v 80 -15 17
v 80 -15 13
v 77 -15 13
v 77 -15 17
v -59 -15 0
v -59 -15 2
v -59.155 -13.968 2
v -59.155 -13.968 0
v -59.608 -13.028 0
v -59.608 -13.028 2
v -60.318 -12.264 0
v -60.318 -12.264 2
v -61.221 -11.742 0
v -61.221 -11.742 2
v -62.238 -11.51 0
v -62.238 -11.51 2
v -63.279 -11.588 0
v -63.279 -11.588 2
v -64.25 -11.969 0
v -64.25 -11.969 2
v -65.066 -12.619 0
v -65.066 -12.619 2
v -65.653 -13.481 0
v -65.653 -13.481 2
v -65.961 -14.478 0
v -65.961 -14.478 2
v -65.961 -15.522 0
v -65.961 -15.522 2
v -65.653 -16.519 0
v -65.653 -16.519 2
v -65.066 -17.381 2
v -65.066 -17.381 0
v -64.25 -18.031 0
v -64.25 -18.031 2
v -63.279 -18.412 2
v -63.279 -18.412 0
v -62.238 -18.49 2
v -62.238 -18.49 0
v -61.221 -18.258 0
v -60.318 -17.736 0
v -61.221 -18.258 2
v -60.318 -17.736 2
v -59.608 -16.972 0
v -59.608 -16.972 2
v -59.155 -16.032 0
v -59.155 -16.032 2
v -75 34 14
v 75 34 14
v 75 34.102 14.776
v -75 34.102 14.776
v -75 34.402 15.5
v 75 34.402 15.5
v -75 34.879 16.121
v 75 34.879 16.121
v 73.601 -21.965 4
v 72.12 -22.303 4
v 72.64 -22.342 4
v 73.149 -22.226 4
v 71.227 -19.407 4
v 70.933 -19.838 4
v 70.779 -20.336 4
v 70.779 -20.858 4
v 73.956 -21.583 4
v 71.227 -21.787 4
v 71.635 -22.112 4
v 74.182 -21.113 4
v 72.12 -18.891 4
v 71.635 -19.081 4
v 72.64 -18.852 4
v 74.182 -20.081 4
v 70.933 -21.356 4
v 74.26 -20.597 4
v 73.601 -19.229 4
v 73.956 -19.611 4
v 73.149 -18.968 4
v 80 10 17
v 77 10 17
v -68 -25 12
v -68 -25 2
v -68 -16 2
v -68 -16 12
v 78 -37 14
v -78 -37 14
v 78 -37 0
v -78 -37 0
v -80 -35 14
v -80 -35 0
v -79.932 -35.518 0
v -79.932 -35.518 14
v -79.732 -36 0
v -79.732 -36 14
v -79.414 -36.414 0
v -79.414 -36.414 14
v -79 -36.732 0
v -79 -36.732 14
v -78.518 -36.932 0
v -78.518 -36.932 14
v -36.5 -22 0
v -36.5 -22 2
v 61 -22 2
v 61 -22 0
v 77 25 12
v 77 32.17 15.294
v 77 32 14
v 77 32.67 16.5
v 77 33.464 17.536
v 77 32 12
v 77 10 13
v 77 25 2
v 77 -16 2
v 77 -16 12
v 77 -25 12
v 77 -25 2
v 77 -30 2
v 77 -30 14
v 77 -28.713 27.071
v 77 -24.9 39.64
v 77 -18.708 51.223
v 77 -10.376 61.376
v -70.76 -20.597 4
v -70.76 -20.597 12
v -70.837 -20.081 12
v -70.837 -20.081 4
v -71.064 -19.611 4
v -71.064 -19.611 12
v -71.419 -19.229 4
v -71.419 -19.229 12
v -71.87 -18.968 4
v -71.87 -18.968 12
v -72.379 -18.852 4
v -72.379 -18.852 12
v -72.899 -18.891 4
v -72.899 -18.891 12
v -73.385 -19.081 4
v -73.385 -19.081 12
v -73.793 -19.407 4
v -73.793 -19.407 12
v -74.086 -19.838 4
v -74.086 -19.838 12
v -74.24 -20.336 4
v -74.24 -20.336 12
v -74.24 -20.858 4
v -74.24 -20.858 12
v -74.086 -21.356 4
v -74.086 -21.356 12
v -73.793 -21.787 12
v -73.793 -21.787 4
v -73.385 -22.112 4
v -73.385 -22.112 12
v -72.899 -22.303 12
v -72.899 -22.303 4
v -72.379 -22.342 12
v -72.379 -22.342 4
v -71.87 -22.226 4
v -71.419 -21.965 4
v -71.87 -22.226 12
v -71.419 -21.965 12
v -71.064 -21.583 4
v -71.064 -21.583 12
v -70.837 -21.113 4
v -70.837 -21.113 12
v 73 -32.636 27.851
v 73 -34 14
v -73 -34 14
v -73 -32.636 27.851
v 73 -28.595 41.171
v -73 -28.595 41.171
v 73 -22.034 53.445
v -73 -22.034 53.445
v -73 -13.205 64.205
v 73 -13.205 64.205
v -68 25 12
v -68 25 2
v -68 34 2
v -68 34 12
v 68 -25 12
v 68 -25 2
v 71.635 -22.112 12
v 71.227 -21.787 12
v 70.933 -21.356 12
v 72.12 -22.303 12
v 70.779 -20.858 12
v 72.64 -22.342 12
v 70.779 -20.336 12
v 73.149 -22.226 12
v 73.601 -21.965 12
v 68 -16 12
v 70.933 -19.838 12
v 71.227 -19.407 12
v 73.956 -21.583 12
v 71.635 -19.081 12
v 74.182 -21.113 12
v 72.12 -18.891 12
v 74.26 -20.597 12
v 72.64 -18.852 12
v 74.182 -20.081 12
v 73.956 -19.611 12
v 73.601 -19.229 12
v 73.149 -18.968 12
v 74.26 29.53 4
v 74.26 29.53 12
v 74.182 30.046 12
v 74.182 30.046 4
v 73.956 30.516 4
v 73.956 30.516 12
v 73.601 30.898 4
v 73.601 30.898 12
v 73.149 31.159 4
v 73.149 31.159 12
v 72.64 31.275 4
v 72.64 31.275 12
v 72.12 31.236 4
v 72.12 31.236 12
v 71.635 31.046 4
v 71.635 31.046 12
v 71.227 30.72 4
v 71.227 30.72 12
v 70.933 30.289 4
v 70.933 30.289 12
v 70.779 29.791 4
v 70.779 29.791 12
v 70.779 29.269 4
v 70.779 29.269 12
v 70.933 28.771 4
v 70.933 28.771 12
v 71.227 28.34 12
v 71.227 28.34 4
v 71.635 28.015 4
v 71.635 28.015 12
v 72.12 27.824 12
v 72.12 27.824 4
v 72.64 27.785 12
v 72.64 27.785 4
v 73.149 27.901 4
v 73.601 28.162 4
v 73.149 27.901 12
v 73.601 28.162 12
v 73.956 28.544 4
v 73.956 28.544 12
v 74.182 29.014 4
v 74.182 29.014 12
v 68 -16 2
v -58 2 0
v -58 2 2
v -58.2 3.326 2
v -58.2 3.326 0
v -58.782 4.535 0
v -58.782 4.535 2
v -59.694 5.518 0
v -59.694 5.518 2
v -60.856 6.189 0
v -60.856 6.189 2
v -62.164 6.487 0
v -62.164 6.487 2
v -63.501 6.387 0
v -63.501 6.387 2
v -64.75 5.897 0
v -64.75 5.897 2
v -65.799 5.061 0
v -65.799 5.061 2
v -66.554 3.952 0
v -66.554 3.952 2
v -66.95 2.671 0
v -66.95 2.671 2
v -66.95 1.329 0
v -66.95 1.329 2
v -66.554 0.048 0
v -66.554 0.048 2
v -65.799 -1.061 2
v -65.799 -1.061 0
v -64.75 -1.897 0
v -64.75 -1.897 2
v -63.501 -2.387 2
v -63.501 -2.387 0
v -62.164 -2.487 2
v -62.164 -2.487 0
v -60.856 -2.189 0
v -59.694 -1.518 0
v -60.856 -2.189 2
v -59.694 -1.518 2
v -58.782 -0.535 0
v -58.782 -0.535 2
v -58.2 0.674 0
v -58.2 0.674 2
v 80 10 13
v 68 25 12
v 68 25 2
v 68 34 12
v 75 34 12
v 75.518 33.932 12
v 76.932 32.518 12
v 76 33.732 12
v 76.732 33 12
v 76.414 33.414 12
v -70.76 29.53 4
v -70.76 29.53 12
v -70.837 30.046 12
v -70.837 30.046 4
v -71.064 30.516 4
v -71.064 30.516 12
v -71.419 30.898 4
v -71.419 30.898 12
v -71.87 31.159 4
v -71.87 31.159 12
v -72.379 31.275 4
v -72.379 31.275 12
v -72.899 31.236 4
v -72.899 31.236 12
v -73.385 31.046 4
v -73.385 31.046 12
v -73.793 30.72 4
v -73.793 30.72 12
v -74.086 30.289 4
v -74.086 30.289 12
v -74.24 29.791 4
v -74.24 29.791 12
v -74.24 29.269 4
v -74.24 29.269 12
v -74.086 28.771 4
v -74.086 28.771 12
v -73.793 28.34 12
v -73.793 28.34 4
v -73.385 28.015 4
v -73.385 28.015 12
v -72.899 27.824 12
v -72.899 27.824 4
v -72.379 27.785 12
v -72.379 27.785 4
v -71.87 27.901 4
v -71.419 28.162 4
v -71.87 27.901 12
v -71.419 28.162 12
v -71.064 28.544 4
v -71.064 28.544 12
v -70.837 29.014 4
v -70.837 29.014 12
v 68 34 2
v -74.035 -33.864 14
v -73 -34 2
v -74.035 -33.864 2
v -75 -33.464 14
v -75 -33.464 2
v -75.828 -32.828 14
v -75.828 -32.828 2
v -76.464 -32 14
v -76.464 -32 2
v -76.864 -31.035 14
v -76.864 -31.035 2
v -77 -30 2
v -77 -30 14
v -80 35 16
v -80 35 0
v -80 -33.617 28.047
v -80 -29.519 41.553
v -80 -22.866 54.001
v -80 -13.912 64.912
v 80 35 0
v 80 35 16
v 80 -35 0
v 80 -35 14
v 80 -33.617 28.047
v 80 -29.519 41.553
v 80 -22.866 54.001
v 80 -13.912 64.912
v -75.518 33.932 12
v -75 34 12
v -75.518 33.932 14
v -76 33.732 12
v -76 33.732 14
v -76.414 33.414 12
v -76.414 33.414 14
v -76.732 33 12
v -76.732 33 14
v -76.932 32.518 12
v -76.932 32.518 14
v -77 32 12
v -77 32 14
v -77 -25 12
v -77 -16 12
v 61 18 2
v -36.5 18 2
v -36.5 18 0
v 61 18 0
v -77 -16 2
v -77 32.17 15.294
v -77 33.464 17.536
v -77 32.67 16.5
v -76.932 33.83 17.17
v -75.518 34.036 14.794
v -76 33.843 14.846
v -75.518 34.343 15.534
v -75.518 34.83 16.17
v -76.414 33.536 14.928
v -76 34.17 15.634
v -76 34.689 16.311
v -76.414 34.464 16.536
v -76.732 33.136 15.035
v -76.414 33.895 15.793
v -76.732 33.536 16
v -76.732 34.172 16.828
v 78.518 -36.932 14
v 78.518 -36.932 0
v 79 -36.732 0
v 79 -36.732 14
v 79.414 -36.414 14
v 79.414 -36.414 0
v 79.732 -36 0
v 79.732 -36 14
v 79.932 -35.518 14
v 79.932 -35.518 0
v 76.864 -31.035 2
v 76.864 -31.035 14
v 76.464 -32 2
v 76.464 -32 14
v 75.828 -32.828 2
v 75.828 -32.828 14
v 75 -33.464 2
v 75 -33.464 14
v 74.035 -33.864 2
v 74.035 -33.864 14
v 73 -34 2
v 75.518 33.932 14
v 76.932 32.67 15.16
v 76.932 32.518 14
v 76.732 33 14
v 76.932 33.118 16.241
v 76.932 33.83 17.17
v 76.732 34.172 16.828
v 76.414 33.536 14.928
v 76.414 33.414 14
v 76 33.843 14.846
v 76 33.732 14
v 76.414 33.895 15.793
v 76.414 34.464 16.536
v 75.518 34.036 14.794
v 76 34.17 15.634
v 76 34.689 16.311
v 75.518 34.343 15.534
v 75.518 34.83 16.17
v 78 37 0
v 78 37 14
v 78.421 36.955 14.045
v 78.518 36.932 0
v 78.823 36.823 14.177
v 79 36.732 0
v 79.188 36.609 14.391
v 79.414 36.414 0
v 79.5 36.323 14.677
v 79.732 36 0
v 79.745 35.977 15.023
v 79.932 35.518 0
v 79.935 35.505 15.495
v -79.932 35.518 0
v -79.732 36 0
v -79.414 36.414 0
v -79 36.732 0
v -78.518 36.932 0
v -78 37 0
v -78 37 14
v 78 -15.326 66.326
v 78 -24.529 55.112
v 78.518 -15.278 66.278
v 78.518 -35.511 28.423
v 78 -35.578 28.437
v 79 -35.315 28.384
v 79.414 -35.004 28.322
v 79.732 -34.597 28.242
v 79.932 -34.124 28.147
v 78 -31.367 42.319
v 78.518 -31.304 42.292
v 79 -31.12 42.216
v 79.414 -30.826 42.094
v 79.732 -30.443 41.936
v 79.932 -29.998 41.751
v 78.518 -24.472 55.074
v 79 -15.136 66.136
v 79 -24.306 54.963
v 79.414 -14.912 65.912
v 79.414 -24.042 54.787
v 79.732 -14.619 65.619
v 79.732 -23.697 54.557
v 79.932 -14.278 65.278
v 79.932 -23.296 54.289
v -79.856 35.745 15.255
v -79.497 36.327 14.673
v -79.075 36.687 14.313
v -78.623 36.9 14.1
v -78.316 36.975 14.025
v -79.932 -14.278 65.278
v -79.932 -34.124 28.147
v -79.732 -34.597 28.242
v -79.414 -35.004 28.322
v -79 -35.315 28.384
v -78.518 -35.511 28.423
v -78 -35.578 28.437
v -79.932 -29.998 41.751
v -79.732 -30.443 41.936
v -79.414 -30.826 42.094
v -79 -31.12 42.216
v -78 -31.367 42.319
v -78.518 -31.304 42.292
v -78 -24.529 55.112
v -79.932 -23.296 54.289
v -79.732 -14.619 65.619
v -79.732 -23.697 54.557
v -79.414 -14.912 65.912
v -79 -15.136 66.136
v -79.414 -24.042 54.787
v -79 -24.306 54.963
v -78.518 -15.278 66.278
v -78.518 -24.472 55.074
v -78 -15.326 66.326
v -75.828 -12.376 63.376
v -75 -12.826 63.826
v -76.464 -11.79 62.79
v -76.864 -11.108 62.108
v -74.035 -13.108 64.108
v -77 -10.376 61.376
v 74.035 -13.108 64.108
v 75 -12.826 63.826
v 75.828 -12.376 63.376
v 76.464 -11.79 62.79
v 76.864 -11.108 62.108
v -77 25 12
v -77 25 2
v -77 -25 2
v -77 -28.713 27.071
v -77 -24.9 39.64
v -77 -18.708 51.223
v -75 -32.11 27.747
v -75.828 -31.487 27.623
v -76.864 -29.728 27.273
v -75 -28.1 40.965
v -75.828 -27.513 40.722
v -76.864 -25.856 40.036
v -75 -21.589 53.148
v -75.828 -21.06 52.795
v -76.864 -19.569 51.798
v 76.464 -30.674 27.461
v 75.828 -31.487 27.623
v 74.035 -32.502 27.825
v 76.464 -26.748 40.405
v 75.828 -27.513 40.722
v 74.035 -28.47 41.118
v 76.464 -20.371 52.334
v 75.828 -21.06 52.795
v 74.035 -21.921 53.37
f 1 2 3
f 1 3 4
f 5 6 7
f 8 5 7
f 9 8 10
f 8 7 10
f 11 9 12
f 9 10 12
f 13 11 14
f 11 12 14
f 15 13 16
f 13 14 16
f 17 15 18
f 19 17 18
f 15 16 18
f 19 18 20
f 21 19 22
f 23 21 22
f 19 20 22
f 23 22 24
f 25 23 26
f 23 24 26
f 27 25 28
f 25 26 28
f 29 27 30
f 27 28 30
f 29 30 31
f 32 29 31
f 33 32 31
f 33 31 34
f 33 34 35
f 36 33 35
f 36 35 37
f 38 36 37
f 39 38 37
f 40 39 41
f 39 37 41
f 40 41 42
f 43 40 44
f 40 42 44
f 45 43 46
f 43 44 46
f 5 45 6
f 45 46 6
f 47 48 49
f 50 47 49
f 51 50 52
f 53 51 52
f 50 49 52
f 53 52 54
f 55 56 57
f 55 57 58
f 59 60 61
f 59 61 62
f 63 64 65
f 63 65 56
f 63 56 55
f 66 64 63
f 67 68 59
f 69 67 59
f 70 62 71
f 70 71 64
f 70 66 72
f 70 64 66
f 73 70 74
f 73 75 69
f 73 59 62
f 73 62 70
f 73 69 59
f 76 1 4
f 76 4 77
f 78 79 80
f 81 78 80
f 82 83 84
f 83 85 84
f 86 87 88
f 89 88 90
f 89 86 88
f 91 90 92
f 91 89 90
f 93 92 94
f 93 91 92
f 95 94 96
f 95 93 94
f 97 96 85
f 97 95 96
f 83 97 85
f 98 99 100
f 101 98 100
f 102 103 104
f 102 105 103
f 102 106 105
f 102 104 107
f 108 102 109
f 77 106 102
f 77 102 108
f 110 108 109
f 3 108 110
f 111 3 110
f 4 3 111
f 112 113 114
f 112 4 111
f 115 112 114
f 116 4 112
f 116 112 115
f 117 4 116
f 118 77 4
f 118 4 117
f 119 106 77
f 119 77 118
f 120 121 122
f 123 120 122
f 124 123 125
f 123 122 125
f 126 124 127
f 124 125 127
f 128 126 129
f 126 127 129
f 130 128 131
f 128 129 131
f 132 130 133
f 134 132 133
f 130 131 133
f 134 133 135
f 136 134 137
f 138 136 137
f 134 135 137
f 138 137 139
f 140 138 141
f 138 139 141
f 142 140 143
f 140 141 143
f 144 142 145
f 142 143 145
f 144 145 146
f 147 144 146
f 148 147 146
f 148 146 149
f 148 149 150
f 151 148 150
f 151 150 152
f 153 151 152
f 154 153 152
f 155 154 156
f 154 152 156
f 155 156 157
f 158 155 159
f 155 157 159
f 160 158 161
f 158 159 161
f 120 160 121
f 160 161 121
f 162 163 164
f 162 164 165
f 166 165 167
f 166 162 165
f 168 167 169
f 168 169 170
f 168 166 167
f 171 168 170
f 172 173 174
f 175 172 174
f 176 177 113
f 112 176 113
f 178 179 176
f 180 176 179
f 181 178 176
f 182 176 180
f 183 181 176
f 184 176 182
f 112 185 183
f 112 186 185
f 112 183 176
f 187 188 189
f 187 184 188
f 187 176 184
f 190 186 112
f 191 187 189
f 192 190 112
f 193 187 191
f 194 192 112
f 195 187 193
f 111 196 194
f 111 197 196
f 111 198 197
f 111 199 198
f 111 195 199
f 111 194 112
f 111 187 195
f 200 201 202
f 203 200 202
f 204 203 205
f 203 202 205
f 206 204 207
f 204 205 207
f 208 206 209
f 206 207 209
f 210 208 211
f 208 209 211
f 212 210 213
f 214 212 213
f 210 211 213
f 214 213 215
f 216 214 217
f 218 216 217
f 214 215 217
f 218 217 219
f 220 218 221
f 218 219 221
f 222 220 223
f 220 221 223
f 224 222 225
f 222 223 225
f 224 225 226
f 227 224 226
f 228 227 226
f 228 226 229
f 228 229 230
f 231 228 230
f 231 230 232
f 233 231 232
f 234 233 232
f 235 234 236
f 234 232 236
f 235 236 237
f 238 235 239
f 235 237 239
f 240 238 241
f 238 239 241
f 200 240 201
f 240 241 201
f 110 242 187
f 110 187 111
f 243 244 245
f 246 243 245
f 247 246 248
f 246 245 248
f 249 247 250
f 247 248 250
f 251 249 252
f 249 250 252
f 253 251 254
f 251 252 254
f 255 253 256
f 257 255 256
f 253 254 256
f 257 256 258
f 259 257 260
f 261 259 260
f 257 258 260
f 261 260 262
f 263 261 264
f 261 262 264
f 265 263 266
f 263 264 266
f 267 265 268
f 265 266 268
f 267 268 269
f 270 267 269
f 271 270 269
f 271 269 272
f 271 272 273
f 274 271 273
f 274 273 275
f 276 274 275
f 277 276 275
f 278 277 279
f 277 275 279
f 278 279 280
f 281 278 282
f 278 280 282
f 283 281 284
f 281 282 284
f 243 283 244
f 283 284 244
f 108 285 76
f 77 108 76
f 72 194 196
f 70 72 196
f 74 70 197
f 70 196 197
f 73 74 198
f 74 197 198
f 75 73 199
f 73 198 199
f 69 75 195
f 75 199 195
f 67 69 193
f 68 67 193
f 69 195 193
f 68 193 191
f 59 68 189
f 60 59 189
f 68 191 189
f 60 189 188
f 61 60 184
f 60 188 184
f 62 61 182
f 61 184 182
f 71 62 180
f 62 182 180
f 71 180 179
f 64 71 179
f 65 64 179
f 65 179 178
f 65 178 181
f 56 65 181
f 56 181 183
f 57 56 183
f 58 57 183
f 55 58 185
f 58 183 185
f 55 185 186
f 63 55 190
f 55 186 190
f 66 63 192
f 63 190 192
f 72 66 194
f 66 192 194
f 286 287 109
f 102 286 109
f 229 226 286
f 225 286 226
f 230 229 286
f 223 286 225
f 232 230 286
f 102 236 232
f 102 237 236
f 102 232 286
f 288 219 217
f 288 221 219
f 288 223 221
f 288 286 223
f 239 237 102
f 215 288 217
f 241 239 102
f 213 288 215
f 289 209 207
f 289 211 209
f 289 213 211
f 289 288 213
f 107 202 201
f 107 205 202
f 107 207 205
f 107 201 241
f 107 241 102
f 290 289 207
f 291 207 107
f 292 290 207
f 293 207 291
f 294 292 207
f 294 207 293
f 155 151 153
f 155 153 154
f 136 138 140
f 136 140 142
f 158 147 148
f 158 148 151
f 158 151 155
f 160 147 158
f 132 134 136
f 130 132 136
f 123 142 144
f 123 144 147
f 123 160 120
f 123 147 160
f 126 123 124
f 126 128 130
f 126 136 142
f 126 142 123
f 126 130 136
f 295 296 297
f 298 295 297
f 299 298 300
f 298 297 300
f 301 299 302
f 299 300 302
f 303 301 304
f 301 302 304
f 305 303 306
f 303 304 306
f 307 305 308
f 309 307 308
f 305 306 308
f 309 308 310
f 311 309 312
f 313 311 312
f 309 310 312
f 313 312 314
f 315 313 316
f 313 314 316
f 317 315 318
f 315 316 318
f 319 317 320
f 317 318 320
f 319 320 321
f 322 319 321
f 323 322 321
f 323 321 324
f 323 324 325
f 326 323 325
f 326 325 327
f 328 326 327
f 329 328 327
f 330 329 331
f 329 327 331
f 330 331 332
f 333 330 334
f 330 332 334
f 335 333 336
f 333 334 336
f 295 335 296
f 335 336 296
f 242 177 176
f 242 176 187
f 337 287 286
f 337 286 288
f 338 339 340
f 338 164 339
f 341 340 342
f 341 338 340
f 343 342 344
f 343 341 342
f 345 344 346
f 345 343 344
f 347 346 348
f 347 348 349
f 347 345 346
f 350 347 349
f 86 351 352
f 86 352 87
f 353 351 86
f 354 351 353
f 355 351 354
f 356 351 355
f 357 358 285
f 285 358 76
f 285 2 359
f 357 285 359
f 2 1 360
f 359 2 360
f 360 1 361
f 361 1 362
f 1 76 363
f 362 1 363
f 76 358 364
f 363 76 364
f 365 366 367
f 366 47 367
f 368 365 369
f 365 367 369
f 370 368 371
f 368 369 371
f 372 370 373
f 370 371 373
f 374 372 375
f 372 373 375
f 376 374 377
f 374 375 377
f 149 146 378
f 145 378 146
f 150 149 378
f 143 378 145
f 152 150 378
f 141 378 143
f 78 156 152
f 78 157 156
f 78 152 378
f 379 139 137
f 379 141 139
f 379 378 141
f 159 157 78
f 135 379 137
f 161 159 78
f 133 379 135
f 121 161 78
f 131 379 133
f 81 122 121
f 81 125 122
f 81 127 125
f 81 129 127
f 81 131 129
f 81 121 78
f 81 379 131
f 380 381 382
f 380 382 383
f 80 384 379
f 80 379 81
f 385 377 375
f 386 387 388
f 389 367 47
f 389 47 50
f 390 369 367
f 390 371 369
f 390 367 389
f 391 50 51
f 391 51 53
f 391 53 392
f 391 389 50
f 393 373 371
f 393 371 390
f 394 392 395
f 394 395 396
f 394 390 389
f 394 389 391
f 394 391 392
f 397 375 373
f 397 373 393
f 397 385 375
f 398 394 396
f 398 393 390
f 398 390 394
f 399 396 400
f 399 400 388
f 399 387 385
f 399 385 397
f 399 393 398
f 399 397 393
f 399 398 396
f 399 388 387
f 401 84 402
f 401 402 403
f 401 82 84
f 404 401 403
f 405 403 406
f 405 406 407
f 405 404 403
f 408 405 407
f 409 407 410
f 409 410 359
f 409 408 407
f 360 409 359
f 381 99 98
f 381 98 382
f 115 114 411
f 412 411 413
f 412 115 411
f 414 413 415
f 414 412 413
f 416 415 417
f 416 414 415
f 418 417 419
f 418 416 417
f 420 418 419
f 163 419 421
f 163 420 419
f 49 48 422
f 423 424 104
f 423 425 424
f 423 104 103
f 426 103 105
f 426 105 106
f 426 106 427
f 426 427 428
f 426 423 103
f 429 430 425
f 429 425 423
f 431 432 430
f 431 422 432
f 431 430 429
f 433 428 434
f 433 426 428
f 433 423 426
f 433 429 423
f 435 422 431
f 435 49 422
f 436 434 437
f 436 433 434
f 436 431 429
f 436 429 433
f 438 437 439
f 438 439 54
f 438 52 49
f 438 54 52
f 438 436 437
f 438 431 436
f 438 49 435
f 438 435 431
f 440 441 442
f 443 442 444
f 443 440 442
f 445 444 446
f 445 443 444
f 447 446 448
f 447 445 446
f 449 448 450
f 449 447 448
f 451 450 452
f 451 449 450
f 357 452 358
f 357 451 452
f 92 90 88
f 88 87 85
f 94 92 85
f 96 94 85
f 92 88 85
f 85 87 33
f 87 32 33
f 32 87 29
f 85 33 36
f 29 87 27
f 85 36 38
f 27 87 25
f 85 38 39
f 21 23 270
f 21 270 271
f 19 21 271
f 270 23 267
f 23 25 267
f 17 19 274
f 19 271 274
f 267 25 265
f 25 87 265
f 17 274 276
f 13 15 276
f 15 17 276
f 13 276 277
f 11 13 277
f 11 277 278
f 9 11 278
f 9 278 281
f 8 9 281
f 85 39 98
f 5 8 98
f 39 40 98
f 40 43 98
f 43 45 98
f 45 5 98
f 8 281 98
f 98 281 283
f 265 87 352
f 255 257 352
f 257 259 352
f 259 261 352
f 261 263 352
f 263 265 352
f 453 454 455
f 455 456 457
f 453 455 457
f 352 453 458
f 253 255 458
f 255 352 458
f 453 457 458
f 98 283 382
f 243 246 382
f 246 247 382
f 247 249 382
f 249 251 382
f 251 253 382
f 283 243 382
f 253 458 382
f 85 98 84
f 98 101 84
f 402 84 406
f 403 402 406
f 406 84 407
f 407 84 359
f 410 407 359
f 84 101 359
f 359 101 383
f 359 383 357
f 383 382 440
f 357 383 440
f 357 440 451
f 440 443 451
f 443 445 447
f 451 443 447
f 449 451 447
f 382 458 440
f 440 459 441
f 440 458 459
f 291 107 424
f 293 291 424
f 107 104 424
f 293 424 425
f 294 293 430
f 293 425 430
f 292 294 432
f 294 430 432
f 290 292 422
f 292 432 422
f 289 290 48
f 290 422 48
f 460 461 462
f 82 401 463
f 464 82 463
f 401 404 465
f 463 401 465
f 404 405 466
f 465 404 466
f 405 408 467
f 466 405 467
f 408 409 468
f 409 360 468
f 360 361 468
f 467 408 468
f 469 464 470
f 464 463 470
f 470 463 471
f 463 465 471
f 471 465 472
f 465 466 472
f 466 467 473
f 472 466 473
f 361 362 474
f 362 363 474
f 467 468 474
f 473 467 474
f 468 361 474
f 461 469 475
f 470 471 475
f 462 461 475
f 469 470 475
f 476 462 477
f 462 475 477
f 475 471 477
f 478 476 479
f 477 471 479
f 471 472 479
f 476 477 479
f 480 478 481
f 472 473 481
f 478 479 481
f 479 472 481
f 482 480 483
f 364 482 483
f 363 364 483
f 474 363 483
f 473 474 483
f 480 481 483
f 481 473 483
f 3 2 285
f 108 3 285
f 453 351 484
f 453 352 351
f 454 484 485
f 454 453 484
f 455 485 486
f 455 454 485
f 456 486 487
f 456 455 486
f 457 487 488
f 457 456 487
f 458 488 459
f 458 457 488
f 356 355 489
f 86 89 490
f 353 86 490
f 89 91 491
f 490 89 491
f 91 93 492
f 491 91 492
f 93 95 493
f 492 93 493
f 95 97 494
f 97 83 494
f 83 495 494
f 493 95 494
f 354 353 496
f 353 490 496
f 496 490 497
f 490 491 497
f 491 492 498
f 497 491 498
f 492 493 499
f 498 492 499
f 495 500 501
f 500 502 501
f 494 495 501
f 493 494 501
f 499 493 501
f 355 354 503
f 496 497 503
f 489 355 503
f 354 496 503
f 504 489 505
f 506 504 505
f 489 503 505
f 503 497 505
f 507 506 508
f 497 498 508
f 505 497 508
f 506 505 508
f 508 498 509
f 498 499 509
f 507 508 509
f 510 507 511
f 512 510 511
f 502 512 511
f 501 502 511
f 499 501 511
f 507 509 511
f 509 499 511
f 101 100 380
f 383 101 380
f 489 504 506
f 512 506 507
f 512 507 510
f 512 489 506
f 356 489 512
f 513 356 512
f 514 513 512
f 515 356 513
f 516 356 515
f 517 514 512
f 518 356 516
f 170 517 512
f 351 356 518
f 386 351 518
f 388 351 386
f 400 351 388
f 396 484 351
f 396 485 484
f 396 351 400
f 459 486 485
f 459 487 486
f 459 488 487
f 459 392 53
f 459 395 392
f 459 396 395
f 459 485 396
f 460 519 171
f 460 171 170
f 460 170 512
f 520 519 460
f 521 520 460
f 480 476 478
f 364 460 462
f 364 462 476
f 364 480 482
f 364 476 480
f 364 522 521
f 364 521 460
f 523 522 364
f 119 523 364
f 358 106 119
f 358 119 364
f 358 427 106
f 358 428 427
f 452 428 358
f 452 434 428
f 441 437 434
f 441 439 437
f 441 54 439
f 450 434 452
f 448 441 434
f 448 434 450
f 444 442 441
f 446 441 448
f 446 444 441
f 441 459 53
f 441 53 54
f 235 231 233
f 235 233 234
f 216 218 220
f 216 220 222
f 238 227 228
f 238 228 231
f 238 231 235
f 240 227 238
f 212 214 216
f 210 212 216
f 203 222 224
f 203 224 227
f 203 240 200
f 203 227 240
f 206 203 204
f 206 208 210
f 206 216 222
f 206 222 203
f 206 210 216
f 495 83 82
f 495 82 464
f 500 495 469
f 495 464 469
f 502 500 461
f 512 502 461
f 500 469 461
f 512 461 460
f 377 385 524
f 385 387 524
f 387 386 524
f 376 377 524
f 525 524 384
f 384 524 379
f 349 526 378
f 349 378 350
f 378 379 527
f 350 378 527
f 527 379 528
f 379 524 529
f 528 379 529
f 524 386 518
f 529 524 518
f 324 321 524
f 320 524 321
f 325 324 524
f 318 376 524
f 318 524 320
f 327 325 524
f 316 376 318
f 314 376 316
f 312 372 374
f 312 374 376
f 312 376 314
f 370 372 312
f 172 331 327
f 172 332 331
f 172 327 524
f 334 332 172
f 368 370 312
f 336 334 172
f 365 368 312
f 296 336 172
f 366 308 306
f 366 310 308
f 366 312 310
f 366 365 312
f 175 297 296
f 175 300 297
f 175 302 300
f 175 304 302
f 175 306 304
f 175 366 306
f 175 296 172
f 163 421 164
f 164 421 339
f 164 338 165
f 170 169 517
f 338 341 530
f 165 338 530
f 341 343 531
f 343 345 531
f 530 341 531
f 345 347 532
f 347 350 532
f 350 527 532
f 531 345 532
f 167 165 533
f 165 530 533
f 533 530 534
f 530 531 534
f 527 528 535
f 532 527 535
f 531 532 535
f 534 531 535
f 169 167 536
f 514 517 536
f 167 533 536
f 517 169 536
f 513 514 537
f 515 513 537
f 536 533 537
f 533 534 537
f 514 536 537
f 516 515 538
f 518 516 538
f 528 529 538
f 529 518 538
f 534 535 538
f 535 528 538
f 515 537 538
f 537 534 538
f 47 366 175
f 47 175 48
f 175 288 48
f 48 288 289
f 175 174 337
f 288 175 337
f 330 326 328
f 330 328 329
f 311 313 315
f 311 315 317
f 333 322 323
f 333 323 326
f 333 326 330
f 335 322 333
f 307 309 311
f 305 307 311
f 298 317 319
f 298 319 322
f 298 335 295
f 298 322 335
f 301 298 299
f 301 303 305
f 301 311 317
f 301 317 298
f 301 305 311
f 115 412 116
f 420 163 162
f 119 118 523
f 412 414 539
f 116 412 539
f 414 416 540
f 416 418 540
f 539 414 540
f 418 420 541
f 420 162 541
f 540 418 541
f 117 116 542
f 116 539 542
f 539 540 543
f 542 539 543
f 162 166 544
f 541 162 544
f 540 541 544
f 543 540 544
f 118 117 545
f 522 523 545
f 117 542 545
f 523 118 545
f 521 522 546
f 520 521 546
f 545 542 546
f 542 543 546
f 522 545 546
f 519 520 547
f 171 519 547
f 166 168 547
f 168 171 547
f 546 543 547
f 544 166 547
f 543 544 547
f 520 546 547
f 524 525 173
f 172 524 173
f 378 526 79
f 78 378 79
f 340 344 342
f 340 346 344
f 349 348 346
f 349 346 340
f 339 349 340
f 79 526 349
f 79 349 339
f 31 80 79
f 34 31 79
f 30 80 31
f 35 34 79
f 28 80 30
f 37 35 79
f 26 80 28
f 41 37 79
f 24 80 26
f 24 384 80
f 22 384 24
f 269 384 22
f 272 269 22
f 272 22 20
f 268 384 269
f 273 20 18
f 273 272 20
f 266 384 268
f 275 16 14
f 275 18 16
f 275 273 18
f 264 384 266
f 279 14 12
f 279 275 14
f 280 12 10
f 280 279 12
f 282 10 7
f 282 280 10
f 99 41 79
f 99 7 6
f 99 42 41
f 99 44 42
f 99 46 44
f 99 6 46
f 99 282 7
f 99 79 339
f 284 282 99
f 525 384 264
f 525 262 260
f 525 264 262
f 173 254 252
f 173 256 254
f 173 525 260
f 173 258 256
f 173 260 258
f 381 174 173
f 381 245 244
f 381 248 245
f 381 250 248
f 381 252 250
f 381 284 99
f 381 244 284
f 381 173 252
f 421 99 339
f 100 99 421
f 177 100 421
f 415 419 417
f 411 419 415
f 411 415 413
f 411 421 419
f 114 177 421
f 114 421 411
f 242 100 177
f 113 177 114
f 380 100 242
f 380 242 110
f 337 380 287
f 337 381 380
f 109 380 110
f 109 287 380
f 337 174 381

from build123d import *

# Parameters (mm, degrees)
F0_W        = 160
F0_H        = 74
F1_DEPTH    = 2
F2_W        = 97.5
F2_H        = 40
F2_R        = 4.5
F2_R_2      = 3.5
F3_DEPTH    = 2
F4_W        = 9
F4_H        = 9
F5_DEPTH    = 10
F6_R        = 1.75
F7_DEPTH    = 8
F8_W        = 160
F8_H        = 74
F9_DEPTH    = 12
F9_FACE_W   = 160
F9_FACE_H   = 74
F9_FACE_W_2 = 154
F9_FACE_H_2 = 68
F10_ANGLE   = 45
F11_W       = 25
F11_H       = 4
F12_DEPTH   = 3
F13_R       = 2
F14_R       = 4


# Not quite as in the source:
# - a feature names something its author has since deleted; it is built from what else it names


with BuildPart() as f1:
    # F0 (on Top) → F1 (new body)
    with BuildSketch(Plane.XY):
        Rectangle(F0_W, F0_H)
    extrude(amount=F1_DEPTH)

    # F2 (on face) → F3 (cut)
    with BuildSketch(Plane.XY.offset(2)):
        with Locations((12.25, -2)):
            Rectangle(F2_W, F2_H)
        with Locations((-62.5, 2)):
            Circle(F2_R)
        with Locations((-62.5, -15)):
            Circle(F2_R_2)
    extrude(amount=-F3_DEPTH, mode=Mode.SUBTRACT)

    # F4 (on face) → F5 (join)
    with BuildSketch(Plane.XY.offset(2)):
        with Locations((72.5, 29.5)):
            Rectangle(F4_W, F4_H)
        with Locations((-72.5, 29.5)):
            Rectangle(F4_W, F4_H)
        with Locations((-72.5, -20.5)):
            Rectangle(F4_W, F4_H)
        with Locations((72.5, -20.5)):
            Rectangle(F4_W, F4_H)
    extrude(amount=F5_DEPTH)

    # F6 (on face) → F7 (cut)
    with BuildSketch(Plane.XY.offset(12)):
        with Locations((-72.5096613169, 29.5301117003)):
            Circle(F6_R)
        with Locations((-72.5096613169, -20.5968357623)):
            Circle(F6_R)
        with Locations((72.5096613169, 29.5301117003)):
            Circle(F6_R)
        with Locations((72.5096613169, -20.5968357623)):
            Circle(F6_R)
    extrude(amount=-F7_DEPTH, mode=Mode.SUBTRACT)

    # F8 (on face) → F9 (join)
    with BuildSketch(Plane.XY.offset(2)):
        Rectangle(F8_W, F8_H)
        Polygon((-77, 25), (-77, 34), (-68, 34), (68, 34), (77, 34), (77, 25), (77, -16), (77, -25), (77, -34), (-77, -34), (-77, -25), (-77, -16), align=None, mode=Mode.SUBTRACT)
    extrude(amount=F9_DEPTH)

    # F9_face (on face) → F10 (revolve)
    with BuildSketch(Plane.XY.offset(14)):
        Rectangle(F9_FACE_W, F9_FACE_H)
        Rectangle(F9_FACE_W_2, F9_FACE_H_2, mode=Mode.SUBTRACT)
    revolve(axis=Axis((0, 37, 14), (-1, 0, 0)), revolution_arc=F10_ANGLE)

    # F11 (on face) → F12 (cut)
    with BuildSketch(Plane.YZ.offset(80)):
        with Locations((-2.5, 15)):
            Rectangle(F11_W, F11_H)
    extrude(amount=-F12_DEPTH, mode=Mode.SUBTRACT)

    # F13
    f13_edges = [f1.edges().sort_by_distance(p)[0] for p in [
        (80, 37, 7),
        (80, -31.367085, 42.318574),
        (80, -37, 7),
        (-80, 37, 7),
        (-80, -31.367085, 42.318574),
        (-80, -37, 7),
        (-77, 34.228361, 15.14805),
        (77, 34.228361, 15.14805),
    ]]
    fillet(f13_edges, radius=F13_R)

    # F14
    f14_edges = [f1.edges().sort_by_distance(p)[0] for p in [
        (-77, -28.595447, 41.170524),
        (77, -28.595447, 41.170524),
    ]]
    fillet(f14_edges, radius=F14_R)


solid = f1.part
